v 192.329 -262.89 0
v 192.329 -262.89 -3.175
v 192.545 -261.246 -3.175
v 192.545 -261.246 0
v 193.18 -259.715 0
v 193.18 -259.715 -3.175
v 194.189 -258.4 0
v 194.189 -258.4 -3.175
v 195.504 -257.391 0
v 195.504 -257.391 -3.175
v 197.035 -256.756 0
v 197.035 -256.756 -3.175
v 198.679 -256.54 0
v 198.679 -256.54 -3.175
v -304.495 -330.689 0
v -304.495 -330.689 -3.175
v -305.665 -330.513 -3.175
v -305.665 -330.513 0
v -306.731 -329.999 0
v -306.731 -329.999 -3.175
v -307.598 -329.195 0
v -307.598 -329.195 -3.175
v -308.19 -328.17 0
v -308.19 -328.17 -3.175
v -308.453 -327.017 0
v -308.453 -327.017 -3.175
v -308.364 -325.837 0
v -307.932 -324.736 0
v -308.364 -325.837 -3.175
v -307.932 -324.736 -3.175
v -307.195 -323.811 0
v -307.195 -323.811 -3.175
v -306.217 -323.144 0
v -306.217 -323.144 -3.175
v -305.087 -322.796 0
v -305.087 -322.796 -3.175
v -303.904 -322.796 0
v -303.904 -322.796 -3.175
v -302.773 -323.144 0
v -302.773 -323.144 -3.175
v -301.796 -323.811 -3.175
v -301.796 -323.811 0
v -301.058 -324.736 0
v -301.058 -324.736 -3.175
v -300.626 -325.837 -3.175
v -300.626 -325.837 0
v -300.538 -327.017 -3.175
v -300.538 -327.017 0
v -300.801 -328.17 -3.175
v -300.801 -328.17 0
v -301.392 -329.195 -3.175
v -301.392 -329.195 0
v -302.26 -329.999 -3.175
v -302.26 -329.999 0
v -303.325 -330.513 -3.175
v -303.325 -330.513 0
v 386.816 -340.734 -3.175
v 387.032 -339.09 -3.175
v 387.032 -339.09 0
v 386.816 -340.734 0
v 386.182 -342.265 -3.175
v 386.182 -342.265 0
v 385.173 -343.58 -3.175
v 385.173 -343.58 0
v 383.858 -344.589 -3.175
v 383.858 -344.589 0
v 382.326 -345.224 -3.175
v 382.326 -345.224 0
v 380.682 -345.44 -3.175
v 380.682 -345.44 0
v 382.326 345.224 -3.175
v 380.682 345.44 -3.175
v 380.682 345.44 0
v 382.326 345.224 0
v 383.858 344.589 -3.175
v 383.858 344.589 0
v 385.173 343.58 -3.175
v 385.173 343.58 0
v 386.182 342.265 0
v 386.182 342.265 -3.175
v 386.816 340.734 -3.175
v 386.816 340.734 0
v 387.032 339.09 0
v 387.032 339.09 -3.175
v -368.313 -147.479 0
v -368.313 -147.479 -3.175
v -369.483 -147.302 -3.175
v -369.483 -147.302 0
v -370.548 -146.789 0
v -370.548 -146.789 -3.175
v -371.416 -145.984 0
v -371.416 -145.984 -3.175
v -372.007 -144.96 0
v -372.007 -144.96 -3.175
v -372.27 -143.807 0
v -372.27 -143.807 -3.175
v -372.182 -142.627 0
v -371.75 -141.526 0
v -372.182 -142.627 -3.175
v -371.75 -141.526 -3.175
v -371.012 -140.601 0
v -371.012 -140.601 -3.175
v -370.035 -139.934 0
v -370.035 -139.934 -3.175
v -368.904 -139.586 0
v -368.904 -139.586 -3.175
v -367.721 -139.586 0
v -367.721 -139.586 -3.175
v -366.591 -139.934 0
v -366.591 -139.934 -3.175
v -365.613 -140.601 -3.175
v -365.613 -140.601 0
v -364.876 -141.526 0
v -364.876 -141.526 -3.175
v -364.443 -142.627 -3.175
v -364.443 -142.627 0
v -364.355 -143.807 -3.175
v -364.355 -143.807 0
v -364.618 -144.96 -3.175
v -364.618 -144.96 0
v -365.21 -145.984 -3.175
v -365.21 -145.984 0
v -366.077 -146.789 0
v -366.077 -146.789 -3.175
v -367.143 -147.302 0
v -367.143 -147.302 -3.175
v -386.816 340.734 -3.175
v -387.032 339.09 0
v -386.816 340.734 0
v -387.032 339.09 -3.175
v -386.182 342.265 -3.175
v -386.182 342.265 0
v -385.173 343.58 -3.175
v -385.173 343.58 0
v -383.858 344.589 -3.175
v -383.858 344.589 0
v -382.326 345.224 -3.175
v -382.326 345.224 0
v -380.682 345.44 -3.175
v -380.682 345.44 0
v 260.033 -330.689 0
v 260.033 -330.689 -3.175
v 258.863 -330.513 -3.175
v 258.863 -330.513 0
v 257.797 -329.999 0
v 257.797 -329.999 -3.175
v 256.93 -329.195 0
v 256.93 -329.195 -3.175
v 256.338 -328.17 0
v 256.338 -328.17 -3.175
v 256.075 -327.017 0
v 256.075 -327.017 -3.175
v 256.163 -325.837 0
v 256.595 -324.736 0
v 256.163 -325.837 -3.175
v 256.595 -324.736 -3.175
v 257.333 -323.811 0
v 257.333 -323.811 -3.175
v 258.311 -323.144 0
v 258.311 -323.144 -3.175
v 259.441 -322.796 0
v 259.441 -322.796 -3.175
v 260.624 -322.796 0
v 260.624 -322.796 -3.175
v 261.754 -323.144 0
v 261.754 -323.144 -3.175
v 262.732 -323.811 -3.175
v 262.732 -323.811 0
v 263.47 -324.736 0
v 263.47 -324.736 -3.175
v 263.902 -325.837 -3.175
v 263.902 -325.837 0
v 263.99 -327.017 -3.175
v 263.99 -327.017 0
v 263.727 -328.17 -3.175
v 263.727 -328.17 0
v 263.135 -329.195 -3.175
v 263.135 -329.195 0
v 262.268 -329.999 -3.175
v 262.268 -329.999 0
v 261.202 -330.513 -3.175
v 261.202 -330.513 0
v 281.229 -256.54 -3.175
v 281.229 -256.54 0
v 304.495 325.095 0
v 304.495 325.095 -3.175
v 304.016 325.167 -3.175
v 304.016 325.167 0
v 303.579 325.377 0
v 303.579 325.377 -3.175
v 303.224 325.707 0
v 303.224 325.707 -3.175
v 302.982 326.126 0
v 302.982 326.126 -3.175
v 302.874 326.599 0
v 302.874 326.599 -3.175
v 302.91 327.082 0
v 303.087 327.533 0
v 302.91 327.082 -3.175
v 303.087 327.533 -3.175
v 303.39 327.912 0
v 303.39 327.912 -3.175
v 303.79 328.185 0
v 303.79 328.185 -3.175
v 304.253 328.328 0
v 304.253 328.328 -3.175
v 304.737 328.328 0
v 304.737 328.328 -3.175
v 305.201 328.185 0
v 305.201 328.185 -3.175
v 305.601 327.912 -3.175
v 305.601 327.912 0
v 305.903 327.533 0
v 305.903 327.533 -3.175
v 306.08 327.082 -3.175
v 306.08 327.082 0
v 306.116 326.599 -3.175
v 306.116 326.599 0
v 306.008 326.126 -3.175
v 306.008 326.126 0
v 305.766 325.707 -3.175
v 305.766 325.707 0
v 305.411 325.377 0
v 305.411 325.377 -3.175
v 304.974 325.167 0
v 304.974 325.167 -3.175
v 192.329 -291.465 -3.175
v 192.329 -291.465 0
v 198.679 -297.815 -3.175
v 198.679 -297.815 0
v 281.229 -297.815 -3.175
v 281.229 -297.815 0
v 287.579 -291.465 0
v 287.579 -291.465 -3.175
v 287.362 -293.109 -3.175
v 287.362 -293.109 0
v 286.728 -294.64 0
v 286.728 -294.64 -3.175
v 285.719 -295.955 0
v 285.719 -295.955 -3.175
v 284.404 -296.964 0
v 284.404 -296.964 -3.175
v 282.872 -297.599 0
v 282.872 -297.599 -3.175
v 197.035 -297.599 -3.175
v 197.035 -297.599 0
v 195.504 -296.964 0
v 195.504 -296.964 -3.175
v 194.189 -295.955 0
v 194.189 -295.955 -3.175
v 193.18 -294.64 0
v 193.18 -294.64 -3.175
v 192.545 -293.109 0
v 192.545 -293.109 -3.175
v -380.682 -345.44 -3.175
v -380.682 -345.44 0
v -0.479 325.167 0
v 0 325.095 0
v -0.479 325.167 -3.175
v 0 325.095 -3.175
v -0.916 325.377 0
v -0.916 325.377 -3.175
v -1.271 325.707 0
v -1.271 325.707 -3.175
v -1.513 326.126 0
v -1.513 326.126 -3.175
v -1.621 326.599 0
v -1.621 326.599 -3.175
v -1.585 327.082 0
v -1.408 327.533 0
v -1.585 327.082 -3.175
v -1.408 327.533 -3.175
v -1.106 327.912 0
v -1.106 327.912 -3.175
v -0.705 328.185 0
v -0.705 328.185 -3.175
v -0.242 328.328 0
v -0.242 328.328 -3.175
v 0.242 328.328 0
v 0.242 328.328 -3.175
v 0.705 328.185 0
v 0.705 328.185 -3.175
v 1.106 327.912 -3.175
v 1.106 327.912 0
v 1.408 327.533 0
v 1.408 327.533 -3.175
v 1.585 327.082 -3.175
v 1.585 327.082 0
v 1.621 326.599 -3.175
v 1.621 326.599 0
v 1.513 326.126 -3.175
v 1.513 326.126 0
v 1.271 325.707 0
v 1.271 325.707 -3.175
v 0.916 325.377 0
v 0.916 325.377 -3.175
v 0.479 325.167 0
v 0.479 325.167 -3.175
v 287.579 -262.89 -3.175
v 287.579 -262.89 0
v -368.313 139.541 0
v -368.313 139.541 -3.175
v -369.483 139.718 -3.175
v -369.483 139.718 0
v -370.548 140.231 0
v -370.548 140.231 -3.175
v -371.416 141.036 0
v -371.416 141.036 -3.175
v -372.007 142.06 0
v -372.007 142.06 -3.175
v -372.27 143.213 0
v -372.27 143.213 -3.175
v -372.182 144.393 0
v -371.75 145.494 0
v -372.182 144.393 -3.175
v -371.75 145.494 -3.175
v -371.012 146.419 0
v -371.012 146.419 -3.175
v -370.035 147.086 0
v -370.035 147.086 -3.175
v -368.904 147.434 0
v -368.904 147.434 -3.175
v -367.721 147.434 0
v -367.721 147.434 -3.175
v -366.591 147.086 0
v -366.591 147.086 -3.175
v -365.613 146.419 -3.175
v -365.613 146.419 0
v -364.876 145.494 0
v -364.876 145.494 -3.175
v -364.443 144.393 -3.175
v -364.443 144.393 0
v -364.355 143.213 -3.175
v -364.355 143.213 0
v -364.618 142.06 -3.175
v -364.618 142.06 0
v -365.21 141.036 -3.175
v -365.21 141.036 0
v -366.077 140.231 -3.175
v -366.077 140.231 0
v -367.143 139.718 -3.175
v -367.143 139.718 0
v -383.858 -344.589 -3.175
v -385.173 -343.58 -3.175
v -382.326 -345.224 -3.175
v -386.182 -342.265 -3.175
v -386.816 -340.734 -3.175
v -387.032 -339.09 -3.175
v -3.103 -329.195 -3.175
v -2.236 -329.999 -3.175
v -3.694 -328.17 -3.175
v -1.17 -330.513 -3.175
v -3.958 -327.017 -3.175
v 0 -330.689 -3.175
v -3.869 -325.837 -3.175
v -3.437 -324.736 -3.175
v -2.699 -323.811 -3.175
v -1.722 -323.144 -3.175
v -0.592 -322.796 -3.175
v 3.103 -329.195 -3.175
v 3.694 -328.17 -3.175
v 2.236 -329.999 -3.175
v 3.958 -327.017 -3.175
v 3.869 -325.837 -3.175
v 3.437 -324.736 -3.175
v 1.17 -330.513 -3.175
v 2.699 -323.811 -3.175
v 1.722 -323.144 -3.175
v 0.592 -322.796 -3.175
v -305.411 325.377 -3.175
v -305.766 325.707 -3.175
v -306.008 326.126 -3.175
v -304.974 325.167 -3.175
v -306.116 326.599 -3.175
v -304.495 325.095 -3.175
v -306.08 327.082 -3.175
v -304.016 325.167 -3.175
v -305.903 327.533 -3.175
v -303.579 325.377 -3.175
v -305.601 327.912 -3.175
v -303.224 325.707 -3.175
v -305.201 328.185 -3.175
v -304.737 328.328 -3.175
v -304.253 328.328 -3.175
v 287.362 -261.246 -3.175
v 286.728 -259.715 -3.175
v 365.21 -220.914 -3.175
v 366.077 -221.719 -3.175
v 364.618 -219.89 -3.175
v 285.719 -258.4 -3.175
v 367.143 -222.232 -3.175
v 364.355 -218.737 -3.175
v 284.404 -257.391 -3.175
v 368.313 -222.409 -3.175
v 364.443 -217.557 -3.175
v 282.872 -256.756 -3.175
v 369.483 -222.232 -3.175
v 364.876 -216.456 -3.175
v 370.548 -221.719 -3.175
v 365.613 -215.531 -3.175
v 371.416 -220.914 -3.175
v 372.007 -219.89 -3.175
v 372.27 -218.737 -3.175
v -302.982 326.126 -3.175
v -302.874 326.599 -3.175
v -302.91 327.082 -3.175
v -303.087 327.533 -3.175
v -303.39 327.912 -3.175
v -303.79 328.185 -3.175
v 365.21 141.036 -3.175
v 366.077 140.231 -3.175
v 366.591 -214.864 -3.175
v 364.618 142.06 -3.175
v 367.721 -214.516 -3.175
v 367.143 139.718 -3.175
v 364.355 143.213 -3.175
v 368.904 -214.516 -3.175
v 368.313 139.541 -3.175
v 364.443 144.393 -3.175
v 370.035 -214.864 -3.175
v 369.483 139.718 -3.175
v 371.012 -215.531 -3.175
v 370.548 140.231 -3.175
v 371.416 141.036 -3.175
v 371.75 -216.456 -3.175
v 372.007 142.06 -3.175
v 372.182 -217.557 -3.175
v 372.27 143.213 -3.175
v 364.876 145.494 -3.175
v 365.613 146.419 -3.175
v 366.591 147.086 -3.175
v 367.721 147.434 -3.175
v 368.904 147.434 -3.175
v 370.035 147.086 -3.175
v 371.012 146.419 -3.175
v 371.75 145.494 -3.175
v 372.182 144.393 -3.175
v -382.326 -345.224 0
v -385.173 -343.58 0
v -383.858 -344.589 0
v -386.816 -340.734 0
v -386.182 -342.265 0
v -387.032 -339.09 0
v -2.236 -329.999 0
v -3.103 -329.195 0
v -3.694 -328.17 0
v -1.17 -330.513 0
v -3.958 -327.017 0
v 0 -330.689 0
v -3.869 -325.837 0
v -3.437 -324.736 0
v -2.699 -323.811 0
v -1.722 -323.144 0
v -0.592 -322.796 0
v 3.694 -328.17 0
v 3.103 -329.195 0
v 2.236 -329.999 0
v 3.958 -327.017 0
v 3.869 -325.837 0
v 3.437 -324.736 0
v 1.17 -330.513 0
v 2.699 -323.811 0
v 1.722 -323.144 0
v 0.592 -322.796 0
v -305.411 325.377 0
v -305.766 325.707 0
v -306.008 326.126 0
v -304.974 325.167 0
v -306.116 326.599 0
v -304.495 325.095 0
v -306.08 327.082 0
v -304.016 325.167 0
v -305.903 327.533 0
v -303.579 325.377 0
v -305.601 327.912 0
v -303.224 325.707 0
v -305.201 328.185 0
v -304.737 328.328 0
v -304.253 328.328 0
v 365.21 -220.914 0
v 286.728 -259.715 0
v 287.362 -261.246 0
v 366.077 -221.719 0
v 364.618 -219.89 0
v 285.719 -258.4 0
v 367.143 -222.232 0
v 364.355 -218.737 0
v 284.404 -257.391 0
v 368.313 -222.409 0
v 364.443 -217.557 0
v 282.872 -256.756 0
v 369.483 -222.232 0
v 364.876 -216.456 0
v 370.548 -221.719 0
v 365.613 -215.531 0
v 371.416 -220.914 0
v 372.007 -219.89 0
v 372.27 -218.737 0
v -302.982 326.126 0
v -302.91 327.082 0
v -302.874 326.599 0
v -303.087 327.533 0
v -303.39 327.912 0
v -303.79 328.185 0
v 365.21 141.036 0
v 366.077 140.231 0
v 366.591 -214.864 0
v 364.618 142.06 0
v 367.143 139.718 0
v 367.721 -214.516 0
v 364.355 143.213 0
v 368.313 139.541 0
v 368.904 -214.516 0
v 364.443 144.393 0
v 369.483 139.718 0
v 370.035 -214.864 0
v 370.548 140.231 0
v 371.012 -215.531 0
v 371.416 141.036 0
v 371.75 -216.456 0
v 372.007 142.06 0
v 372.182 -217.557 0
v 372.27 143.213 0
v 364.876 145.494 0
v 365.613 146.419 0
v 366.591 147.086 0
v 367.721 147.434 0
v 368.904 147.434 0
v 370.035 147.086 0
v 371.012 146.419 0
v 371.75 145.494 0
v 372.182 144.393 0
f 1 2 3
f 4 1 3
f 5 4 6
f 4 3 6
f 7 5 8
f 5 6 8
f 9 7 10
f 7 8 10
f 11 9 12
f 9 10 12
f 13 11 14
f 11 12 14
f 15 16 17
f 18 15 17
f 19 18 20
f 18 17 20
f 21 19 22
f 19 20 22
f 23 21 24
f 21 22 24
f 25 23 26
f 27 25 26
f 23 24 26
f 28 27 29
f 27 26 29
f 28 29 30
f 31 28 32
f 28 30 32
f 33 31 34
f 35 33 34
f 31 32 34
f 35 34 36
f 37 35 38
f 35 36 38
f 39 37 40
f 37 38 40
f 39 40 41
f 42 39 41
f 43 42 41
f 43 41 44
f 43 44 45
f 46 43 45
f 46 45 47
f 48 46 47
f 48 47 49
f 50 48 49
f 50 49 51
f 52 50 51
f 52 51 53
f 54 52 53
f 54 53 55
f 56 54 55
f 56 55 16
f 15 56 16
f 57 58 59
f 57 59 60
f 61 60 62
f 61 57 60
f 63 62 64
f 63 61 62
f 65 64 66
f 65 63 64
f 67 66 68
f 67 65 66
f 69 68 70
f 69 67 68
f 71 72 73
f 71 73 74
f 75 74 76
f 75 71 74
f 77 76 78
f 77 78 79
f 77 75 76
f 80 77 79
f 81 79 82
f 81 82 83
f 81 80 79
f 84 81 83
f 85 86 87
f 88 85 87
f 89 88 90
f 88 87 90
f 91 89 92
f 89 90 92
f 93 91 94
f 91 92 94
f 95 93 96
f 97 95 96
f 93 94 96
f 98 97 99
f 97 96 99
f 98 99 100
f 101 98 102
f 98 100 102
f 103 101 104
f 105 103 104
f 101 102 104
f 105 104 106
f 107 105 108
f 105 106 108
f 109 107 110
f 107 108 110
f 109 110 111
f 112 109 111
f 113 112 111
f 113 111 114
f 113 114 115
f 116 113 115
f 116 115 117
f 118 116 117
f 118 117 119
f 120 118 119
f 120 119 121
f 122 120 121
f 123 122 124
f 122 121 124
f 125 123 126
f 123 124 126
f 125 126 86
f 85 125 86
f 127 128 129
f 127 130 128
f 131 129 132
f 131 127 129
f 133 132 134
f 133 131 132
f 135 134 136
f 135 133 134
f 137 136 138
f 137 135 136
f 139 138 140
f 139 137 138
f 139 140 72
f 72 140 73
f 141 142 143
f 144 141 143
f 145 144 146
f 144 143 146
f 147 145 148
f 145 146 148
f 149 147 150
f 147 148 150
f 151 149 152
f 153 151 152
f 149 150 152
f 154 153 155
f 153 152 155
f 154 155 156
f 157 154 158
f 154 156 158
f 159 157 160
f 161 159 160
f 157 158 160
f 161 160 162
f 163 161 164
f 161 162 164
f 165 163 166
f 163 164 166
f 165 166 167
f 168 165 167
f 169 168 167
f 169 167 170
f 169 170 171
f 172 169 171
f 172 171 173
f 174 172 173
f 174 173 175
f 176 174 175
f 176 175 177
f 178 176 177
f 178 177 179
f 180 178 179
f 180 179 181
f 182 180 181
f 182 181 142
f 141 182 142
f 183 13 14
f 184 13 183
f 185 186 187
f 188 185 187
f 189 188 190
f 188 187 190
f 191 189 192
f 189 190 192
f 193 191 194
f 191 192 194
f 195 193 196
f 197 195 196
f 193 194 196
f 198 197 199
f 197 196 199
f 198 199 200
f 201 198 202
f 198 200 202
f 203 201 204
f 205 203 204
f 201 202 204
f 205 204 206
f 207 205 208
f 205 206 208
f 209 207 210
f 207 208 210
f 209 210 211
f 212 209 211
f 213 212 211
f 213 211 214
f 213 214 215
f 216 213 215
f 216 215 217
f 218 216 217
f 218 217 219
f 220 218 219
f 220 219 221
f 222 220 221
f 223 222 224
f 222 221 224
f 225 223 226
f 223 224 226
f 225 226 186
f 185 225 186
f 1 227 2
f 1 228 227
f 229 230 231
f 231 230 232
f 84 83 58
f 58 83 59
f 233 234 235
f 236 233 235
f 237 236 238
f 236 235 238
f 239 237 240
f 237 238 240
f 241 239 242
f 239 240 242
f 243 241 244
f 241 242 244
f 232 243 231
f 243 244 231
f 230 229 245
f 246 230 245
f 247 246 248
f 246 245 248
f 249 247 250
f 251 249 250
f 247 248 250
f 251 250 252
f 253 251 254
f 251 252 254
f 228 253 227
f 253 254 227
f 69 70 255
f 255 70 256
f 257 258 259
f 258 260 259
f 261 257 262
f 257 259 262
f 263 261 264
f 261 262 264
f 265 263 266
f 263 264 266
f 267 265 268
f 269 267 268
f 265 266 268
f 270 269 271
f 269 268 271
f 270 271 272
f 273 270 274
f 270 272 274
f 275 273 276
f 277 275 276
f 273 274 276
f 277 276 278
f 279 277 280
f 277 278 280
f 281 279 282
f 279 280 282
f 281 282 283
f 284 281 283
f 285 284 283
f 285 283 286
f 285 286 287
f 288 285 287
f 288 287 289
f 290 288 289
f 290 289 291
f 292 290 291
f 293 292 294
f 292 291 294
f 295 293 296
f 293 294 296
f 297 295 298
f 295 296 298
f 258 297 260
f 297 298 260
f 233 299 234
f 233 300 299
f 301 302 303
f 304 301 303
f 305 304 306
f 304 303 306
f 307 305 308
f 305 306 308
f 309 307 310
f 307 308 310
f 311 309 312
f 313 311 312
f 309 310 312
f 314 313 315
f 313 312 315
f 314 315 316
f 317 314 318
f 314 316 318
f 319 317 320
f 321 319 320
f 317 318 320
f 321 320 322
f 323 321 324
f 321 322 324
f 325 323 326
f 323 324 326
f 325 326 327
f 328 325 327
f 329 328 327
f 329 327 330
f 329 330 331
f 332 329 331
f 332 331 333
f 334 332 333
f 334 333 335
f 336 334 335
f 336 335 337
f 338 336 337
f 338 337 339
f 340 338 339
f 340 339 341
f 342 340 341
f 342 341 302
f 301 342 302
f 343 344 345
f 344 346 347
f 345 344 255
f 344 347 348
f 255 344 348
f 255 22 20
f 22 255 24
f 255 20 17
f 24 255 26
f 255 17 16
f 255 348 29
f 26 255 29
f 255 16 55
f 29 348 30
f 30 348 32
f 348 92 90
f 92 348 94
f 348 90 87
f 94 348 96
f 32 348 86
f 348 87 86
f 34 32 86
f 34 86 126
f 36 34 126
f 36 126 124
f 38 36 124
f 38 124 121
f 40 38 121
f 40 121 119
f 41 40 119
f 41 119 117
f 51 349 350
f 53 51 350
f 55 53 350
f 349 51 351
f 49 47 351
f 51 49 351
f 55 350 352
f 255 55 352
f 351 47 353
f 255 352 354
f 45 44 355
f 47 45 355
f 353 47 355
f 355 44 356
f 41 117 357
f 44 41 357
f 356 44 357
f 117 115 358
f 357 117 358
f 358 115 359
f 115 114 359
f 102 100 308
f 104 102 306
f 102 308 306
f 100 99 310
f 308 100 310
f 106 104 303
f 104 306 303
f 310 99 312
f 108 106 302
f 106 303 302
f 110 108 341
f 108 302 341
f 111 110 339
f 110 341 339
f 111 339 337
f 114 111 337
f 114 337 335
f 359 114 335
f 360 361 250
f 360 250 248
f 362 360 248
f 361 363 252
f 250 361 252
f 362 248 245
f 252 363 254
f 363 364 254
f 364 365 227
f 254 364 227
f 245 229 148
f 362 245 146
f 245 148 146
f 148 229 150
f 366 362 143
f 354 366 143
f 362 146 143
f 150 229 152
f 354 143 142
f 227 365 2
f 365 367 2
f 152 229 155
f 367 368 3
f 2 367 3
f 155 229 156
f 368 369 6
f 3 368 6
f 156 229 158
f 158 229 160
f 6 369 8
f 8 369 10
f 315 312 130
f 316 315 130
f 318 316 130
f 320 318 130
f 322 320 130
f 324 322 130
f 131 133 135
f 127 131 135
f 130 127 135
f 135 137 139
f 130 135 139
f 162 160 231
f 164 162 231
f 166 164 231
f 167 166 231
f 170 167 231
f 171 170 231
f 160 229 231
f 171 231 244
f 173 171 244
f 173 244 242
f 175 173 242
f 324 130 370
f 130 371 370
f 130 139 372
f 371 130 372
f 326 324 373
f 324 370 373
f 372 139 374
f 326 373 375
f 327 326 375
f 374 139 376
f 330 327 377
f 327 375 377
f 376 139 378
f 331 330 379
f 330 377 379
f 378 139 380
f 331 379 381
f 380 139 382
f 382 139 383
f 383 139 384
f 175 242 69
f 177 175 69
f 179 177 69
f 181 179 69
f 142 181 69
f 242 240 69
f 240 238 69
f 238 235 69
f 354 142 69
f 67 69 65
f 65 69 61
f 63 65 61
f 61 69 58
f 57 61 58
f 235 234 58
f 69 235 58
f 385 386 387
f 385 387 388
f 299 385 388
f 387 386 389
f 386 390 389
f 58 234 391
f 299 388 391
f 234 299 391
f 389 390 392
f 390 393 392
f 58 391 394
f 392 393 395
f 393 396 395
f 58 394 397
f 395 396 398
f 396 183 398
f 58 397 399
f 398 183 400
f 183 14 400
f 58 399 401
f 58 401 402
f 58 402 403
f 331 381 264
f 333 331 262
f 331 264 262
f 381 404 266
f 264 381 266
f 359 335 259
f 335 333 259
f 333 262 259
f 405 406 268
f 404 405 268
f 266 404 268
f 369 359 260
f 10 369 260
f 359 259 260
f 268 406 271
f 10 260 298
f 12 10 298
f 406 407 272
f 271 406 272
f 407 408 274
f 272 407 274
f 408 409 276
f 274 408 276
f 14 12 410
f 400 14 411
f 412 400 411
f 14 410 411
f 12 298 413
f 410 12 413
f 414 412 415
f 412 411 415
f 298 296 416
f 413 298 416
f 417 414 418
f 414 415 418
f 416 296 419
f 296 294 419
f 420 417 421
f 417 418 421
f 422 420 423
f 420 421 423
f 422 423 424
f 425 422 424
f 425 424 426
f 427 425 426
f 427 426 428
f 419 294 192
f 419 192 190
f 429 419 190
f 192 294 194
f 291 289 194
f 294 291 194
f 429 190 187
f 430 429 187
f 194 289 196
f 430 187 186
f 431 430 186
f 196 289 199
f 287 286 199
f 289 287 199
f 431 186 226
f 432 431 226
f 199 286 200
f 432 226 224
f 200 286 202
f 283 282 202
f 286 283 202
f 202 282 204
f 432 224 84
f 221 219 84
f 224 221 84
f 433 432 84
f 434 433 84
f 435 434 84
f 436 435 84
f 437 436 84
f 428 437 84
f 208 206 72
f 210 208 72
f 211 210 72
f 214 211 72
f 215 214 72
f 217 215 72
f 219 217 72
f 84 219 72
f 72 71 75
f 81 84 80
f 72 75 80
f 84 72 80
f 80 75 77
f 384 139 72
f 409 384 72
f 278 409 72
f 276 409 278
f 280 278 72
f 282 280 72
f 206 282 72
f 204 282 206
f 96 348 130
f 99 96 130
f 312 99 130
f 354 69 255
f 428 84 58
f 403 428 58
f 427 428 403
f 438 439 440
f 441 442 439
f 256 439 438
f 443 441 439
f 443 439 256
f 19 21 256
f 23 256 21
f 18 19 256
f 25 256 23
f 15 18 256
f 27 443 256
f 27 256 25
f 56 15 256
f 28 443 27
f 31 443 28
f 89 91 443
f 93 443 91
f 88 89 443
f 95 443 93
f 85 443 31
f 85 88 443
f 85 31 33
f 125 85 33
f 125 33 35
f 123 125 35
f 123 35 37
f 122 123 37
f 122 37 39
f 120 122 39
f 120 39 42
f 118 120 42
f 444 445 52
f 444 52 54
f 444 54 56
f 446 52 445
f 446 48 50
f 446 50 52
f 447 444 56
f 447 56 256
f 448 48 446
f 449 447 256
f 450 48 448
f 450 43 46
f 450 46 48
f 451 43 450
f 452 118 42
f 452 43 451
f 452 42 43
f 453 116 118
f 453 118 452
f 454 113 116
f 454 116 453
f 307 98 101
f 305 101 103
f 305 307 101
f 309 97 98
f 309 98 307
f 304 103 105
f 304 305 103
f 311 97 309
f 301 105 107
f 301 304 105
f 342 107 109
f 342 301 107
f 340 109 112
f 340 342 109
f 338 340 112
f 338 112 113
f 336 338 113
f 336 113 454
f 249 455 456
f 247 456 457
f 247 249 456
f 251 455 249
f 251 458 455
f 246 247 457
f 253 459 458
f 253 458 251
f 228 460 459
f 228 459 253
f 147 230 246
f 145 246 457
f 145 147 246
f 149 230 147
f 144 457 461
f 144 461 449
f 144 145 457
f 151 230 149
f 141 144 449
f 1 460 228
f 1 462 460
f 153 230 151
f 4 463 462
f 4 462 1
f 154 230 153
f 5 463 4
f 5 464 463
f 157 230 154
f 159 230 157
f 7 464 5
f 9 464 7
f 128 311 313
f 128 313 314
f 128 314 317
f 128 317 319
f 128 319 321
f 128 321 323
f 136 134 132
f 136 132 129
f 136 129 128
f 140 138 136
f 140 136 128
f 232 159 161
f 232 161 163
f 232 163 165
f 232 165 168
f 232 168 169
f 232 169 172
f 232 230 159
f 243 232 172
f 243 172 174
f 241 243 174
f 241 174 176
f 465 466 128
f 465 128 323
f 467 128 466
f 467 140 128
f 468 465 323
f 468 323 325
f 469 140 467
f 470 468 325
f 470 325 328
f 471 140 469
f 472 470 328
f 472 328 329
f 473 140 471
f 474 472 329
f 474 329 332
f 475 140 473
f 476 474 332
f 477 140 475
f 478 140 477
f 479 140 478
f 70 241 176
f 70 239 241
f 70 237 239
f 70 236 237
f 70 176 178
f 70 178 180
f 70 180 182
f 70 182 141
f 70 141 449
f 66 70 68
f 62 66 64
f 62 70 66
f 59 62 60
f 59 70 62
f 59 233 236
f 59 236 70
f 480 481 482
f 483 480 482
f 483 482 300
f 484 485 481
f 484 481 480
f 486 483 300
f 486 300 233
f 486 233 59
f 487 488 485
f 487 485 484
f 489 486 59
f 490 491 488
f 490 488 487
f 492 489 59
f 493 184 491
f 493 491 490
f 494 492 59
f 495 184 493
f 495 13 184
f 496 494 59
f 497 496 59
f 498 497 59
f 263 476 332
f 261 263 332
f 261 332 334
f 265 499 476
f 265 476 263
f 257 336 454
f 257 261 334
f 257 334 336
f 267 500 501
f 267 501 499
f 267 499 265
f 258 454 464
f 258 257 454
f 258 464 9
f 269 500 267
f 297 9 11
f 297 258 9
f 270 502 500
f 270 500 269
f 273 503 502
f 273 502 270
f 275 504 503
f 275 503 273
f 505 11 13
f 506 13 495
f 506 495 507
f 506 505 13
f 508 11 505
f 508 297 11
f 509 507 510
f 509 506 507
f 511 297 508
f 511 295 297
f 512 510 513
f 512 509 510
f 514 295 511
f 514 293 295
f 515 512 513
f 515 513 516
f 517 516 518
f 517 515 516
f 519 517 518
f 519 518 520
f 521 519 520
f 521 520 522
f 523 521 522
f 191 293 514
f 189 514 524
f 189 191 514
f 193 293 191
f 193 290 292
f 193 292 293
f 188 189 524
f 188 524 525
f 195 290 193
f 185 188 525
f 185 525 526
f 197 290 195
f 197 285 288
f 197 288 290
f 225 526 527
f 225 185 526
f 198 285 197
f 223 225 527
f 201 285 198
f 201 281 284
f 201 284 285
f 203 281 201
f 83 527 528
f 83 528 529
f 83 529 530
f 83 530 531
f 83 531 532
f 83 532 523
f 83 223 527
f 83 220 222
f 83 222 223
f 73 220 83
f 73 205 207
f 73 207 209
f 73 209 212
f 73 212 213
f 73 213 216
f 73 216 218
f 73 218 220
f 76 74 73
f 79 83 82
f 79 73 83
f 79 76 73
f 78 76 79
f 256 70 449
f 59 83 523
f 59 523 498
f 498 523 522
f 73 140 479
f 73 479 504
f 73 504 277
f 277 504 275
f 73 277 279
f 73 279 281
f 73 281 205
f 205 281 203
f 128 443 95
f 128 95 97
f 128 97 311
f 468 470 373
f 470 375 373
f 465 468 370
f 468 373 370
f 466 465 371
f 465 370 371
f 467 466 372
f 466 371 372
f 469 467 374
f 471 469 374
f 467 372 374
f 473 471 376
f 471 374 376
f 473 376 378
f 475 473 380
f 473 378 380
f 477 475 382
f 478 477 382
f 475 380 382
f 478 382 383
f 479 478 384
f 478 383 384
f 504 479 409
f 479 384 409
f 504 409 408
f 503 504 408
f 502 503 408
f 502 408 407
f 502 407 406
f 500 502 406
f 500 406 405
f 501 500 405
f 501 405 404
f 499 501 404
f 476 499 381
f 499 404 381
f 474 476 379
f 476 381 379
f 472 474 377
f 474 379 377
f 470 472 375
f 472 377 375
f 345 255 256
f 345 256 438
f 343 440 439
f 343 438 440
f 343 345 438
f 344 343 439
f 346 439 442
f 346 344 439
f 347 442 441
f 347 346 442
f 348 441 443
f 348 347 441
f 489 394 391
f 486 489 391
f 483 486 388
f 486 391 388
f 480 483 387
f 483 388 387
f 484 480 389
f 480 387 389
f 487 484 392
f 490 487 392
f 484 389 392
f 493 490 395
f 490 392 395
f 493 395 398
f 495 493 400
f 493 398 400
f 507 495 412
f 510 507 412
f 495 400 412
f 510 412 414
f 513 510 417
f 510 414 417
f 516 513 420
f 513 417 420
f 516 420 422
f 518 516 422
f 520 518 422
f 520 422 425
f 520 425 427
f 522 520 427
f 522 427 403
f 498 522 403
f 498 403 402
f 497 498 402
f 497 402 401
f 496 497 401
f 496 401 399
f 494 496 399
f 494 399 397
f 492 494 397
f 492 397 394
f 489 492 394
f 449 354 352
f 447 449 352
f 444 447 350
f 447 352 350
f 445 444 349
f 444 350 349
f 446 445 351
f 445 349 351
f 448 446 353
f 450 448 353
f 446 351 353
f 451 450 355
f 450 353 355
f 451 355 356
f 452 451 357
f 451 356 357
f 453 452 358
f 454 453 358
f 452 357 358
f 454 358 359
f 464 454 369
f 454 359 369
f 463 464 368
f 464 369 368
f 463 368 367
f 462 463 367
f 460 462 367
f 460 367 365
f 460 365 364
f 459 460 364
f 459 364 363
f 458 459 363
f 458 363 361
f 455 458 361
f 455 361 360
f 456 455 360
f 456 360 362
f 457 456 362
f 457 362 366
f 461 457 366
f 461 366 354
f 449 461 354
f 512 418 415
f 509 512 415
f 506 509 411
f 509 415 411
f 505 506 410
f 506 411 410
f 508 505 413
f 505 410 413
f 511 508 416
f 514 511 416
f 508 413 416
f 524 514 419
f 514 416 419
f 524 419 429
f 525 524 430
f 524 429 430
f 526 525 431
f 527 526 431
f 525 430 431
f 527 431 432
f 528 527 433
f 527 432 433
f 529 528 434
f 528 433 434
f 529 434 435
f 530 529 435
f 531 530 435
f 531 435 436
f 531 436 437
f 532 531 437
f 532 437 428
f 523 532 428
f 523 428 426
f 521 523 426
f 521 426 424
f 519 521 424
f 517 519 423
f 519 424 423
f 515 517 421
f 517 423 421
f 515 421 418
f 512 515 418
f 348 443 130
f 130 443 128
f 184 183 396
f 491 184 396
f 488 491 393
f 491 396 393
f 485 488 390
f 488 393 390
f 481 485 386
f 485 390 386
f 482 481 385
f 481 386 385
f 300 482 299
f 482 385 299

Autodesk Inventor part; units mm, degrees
ref_plane "YZ Plane" through (0, 0, 0) normal (1, 0, 0) x (0, 1, 0)
ref_plane "XZ Plane" through (0, 0, 0) normal (0, 1, 0) x (-1, 0, 0)
ref_plane "XY Plane" through (0, 0, 0) normal (0, 0, 1) x (1, 0, 0)
sketch "Sketch1" plane through (0, 0, 0) normal (0, 0, 1) x (1, 0, 0)
  line L0 (0, 483.616) -> (0, -483.616) projected
  line L1 (-541.8455, 0) -> (541.8455, 0) projected
  line L2 (387.0325, -345.44) -> (-387.0325, -345.44)
  line L3 (-387.0325, -345.44) -> (-387.0325, 345.44)
  line L4 (-387.0325, 345.44) -> (387.0325, 345.44)
  line L5 (387.0325, 345.44) -> (387.0325, -345.44)
  line L6 (387.0325, -345.44) -> (-387.0325, 345.44) construction
  line L7 (-387.0325, -345.44) -> (387.0325, 345.44) construction
  line L8 (368.3127, -326.7202) -> (-368.3127, -326.7202) construction
  line L9 (-368.3127, -326.7202) -> (-368.3127, 326.7202) construction
  line L10 (-368.3127, 326.7202) -> (368.3127, 326.7202) construction
  line L11 (368.3127, 326.7202) -> (368.3127, -326.7202) construction
  line L12 (368.3127, -326.7202) -> (-368.3127, 326.7202) construction
  line L13 (-368.3127, -326.7202) -> (368.3127, 326.7202) construction
  point P0 (0, 0)
  point P1 (-304.4952, 326.7202)
  point P2 (0, 326.7202)
  point P3 (304.4952, 326.7202)
  point P4 (-304.4952, -326.7202)
  point P5 (0, -326.7202)
  point P6 (-368.3127, 143.51)
  point P7 (-368.3127, -143.51)
  point P8 (368.3127, 143.51)
  point P9 (260.0325, -326.7202)
  point P10 (368.3127, -218.44)
  dimension "d0" = 774.065
  dimension "d1" = 690.88
  dimension "d3" = 18.7198
  dimension "d4" = 18.7198
  dimension "d5" = 304.4952
  dimension "d6" = 304.4952
  dimension "d7" = 143.51
  dimension "d8" = 143.51
  dimension "d9" = 82.5373
  dimension "d10" = 201.93
  dimension "d22" = 127
  dimension "d23" = 127
extrude "Extrusion1" add sketch "Sketch1" against normal blind 3.175
hole "Hole1" at (-304.4952, -326.7202, 0) at (0, -326.7202, 0) at (-368.3127, 143.51, 0) at (-368.3127, -143.51, 0) at (368.3127, 143.51, 0) at (368.3127, -218.44, 0) at (260.0325, -326.7202, 0) direction (0, 0, -1) diameter 7.9375 end through all
fillet "Fillet1" radius 6.35 4 edges at (387.0325, 345.44, -1.5875) (387.0325, -345.44, -1.5875) (-387.0325, -345.44, -1.5875) (-387.0325, 345.44, -1.5875)
sketch "Sketch2" plane through (0, 0, 0) normal (0, 0, 1) x (1, 0, 0)
  line L0 (380.6825, -345.44) -> (-380.6825, -345.44) projected
  line L1 (387.0325, 345.44) -> (387.0325, -345.44) projected
  line L2 (387.0325, -345.44) -> (310.8325, -345.44)
  line L3 (387.0325, -269.24) -> (387.0325, -345.44)
  line L4 (380.6825, -345.44) -> (-380.6825, -345.44) projected
  line L5 (192.3288, -345.44) -> (192.3288, -256.54)
  line L6 (192.3288, -256.54) -> (287.5788, -256.54)
  line L7 (287.5788, -256.54) -> (287.5788, -345.44)
  line L8 (192.3288, -256.54) -> (287.5788, -345.44) construction
  line L9 (192.3288, -345.44) -> (287.5788, -256.54) construction
  line L10 (0, 483.616) -> (0, -483.616) construction
  line L11 (-541.8455, 0) -> (541.8455, 0) construction
  line L12 (192.3288, -297.815) -> (287.5788, -297.815)
  point P0 (0, 0)
  point P1 (239.9538, -300.99)
  point P2 (192.3288, -345.44)
  dimension "d28" = 239.9538
  dimension "d29" = 95.25
  dimension "d30" = 88.9
  dimension "d31" = 47.625
extrude "Extrusion2" cut sketch "Sketch2" against normal through all contours L12 L5 L6 L7
fillet "Fillet3" radius 6.35 4 edges at (192.3288, -256.54, -1.5875) (287.5788, -256.54, -1.5875) (287.5788, -297.815, -1.5875) (192.3288, -297.815, -1.5875)
hole "Hole2" at (-304.4952, 326.7202, 0) at (0, 326.7202, 0) at (304.4952, 326.7202, 0) direction (0, 0, -1) diameter 3.2512 end through all
properties material "ALUMINUM, 6061-T651"
